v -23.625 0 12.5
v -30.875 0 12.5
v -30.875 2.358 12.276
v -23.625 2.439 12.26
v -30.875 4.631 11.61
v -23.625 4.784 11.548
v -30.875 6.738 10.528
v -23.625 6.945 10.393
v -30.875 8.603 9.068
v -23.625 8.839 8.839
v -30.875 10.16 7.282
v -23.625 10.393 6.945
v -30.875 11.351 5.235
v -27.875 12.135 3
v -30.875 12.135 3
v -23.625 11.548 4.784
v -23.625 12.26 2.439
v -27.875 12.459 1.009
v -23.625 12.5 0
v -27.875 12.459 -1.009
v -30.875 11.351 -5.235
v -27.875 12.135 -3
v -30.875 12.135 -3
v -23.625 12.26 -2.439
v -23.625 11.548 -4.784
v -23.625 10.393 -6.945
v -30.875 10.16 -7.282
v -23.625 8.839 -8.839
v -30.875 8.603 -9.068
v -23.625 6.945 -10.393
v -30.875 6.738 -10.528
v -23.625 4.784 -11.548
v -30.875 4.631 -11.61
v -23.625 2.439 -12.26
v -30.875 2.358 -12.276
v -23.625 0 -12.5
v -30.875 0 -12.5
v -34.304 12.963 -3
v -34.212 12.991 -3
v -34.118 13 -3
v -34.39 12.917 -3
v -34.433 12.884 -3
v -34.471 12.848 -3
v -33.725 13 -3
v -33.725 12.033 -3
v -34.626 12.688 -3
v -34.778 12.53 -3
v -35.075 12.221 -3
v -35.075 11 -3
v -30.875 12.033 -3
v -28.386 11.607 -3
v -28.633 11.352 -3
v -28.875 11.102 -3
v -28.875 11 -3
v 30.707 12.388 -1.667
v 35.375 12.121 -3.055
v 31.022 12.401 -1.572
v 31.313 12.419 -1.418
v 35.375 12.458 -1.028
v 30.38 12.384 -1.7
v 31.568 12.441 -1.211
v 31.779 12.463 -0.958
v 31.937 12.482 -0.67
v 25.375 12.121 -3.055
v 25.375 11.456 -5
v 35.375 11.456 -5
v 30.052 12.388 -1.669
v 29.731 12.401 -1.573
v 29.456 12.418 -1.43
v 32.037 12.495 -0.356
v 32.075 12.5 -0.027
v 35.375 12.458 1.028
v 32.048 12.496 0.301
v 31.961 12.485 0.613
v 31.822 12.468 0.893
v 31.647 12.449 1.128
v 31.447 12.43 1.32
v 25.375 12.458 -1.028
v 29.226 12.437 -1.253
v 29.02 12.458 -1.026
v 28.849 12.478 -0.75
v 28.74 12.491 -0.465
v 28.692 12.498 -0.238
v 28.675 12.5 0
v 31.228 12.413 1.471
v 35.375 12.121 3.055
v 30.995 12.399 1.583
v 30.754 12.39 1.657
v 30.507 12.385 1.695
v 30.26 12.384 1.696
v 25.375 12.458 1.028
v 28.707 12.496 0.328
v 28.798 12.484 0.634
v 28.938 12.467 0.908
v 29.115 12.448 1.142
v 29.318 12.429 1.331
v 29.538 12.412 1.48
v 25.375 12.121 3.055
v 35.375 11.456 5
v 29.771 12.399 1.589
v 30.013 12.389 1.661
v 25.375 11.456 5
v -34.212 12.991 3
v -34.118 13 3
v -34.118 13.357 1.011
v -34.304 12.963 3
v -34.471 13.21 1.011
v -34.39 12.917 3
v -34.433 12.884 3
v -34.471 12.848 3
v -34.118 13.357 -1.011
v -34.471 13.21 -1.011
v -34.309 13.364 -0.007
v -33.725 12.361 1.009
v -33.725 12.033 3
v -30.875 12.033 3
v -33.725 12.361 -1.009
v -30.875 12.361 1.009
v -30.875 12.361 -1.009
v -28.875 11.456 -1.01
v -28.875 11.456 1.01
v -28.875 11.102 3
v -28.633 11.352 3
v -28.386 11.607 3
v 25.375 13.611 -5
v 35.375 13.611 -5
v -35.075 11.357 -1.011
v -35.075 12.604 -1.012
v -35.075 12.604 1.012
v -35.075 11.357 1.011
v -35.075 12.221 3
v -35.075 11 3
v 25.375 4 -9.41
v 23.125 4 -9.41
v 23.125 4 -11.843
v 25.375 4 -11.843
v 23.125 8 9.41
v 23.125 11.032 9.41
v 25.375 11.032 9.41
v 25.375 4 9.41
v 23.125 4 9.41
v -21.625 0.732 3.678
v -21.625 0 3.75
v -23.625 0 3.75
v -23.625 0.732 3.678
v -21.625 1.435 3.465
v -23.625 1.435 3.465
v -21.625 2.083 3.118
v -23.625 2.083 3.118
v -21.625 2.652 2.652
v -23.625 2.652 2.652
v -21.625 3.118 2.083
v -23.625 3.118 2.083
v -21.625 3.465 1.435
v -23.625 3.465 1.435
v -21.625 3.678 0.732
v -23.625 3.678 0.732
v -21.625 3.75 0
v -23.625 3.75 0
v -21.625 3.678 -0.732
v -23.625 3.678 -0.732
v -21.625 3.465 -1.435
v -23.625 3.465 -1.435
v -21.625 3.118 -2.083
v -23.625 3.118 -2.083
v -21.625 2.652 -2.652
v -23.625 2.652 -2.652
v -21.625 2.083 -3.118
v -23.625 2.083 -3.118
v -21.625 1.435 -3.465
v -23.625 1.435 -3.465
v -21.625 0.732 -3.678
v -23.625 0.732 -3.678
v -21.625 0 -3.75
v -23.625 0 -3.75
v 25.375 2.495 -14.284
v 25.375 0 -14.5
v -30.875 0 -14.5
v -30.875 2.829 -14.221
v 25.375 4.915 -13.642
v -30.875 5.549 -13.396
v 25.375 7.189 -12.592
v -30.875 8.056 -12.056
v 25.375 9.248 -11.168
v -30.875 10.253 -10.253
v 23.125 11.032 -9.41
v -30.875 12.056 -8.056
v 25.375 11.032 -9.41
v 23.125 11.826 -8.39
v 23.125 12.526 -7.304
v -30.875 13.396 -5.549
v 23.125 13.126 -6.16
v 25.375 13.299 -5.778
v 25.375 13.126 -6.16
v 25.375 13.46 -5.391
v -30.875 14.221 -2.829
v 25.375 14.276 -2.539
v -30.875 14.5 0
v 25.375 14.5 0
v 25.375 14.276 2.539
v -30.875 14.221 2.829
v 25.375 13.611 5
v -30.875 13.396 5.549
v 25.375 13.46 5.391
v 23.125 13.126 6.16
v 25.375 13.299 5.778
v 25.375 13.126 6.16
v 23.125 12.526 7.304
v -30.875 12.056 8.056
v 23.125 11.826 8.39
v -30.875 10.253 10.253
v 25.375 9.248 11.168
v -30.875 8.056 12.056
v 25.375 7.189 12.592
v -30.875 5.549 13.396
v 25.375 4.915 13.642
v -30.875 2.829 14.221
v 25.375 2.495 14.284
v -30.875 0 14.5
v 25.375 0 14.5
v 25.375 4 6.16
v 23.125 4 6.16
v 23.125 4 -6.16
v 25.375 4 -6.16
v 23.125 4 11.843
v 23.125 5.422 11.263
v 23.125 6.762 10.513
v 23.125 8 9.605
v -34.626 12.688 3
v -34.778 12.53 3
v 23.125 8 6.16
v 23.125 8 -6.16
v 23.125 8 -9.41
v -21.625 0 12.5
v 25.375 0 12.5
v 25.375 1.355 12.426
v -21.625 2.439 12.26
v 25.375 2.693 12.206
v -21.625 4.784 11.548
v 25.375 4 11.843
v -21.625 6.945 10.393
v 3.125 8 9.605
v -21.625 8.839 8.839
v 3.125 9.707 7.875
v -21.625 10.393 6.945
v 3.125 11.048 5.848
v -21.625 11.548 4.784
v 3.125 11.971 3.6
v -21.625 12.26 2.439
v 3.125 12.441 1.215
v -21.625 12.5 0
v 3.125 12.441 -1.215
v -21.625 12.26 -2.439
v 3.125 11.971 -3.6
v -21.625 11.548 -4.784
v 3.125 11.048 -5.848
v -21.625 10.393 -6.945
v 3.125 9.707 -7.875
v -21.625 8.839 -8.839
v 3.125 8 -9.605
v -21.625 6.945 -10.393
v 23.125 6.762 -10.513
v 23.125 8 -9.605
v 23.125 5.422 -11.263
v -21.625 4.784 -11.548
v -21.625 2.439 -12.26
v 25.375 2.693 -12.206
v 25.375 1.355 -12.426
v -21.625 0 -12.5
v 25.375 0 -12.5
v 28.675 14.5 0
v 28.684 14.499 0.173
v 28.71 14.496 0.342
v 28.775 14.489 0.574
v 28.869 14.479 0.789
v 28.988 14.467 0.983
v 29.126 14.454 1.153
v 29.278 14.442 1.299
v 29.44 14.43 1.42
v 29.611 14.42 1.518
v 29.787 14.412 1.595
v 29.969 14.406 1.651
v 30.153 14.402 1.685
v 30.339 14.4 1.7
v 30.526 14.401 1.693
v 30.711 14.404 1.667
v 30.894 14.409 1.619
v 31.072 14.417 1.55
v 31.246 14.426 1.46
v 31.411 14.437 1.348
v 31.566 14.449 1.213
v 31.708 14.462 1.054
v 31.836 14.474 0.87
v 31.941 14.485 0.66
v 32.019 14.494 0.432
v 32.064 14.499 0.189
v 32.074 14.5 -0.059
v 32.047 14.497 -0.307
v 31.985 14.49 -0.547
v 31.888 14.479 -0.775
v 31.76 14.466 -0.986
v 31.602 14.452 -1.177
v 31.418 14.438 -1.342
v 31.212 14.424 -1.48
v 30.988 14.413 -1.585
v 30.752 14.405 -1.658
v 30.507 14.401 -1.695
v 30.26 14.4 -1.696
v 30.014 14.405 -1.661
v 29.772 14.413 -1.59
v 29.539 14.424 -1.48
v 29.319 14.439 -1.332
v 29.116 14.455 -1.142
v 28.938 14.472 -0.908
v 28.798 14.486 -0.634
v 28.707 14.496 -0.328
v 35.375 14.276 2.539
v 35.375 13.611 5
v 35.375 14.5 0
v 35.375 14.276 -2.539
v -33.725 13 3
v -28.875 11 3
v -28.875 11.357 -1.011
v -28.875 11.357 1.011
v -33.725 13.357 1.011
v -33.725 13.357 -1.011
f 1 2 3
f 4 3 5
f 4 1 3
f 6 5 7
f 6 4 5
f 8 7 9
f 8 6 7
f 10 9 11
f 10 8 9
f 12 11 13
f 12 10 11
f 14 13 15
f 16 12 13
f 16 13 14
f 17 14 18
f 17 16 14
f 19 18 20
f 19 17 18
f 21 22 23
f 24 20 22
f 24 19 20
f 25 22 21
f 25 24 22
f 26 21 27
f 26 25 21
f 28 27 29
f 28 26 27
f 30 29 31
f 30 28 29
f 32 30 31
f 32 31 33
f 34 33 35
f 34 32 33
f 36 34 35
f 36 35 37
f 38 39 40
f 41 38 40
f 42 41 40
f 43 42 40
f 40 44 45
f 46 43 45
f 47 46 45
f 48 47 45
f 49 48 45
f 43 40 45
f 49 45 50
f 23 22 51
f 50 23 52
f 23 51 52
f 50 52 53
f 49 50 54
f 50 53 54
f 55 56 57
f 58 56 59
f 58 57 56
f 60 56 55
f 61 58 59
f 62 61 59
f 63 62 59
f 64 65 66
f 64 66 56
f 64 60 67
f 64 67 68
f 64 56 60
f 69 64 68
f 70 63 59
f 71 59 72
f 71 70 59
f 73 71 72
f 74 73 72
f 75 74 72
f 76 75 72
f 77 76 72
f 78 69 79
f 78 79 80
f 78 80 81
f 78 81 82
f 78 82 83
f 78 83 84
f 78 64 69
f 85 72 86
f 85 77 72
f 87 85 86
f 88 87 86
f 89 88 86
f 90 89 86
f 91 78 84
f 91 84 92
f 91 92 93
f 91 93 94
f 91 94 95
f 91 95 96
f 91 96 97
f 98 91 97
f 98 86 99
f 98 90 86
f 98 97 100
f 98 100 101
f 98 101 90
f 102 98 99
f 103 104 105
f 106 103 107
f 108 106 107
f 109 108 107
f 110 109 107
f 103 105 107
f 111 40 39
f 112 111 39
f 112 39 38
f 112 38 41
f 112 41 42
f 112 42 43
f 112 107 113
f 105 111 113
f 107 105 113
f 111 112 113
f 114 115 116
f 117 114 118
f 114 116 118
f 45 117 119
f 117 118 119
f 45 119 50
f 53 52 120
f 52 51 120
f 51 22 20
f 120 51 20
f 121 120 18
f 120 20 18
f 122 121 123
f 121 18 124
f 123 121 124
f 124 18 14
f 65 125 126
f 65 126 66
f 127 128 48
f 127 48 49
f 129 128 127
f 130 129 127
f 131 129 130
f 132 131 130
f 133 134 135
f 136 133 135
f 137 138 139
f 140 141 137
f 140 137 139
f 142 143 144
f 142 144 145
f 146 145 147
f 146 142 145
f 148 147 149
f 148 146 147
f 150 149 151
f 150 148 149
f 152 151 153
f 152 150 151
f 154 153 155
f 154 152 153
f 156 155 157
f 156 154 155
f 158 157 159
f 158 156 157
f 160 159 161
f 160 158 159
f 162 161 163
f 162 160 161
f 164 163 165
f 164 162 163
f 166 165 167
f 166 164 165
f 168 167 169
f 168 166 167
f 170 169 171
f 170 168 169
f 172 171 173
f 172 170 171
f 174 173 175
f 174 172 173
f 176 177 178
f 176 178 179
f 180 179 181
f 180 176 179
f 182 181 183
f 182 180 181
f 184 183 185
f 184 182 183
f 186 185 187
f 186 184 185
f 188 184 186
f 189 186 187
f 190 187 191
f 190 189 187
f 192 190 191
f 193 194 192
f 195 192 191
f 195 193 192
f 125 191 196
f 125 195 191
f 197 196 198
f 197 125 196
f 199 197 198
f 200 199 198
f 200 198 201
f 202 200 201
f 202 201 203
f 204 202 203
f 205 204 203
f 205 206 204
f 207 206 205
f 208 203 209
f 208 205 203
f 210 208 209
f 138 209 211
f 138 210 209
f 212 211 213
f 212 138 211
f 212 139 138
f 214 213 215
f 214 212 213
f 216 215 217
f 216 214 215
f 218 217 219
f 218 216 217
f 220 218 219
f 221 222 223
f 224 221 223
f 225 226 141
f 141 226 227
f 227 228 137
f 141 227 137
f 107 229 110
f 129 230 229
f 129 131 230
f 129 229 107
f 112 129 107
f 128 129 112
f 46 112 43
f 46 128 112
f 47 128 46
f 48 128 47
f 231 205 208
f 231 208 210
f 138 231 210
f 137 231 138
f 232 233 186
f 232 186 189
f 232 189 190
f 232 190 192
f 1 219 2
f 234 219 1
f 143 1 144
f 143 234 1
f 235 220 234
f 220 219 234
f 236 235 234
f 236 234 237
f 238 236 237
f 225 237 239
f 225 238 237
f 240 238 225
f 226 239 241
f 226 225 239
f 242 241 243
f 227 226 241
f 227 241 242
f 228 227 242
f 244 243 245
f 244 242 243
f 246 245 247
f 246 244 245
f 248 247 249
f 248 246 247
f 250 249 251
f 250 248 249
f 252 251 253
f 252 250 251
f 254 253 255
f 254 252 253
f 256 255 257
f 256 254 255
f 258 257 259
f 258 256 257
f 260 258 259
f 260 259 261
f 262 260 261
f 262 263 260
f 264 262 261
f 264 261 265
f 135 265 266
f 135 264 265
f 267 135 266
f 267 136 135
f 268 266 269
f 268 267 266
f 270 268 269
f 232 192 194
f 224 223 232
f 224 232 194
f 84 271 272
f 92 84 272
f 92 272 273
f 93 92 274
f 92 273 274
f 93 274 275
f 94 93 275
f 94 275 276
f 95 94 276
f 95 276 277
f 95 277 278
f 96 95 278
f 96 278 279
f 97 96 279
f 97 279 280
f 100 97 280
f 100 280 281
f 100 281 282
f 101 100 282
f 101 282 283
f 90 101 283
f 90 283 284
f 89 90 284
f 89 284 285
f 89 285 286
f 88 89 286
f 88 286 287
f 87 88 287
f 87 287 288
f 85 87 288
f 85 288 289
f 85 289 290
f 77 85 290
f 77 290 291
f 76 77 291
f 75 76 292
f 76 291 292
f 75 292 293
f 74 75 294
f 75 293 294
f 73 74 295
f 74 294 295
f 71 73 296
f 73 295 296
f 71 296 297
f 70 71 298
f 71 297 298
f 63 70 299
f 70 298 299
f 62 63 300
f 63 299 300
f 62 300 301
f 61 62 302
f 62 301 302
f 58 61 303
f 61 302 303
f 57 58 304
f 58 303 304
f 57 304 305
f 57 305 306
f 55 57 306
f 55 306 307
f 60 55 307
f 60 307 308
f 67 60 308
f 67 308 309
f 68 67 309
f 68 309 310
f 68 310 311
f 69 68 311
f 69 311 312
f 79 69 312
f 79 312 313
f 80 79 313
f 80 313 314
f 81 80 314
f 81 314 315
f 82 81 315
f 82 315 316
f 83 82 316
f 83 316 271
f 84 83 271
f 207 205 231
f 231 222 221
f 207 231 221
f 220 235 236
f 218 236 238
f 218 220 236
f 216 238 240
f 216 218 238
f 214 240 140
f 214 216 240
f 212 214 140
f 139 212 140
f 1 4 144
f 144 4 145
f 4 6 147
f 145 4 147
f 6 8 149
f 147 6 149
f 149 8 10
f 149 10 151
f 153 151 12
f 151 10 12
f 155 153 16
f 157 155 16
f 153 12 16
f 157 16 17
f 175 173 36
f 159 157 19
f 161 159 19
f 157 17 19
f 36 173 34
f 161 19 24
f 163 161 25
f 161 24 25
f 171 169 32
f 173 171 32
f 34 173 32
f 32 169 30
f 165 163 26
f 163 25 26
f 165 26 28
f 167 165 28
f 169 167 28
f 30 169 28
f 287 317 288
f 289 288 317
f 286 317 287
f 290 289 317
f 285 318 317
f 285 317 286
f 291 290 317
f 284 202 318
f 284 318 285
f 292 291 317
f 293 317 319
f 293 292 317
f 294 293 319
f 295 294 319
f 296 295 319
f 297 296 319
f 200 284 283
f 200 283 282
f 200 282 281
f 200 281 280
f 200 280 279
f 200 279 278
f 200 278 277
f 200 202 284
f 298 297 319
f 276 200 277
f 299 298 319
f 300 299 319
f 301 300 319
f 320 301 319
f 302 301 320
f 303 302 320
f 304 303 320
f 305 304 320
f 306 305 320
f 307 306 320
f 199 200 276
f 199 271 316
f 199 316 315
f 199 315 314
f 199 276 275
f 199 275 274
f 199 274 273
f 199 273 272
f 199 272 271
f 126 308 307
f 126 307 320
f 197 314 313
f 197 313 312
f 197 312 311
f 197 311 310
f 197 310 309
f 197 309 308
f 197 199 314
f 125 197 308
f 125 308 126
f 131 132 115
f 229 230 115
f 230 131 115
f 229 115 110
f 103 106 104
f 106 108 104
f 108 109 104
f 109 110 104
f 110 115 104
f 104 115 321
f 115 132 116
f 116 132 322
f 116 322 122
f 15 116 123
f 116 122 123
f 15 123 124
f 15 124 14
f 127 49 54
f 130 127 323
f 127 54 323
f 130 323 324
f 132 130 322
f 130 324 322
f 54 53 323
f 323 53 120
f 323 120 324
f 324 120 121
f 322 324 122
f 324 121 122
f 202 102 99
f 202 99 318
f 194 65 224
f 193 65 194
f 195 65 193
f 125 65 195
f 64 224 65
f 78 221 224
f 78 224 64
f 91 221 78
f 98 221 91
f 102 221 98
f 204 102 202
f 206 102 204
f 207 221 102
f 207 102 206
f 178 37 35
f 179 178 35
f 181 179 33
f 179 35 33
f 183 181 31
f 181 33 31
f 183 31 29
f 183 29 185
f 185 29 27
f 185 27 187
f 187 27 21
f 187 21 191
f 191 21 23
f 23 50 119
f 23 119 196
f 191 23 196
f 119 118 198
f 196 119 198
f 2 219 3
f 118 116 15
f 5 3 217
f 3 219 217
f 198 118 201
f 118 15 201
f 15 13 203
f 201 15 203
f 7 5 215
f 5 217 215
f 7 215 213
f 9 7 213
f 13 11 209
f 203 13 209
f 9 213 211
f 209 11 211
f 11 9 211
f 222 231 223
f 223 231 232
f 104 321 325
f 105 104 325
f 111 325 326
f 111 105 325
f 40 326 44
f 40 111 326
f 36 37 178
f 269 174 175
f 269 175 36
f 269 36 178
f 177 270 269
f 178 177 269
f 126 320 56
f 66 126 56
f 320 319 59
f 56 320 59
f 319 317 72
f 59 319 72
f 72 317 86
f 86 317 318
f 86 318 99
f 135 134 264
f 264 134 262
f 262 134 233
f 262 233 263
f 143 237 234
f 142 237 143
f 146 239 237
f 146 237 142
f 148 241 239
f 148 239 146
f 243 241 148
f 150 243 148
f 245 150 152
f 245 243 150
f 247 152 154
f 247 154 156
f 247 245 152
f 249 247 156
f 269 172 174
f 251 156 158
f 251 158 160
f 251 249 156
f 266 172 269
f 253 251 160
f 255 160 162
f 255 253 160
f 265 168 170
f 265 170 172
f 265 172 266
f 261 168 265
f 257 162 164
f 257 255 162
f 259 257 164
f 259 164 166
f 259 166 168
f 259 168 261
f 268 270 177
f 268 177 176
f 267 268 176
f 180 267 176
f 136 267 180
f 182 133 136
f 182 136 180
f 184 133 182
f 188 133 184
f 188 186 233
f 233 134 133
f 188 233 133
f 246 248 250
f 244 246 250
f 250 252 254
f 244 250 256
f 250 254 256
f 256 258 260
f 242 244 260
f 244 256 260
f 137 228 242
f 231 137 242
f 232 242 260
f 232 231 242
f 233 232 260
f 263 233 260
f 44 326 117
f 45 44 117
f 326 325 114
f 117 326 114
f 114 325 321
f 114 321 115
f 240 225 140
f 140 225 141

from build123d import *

# Parameters (mm, degrees)
SALIENTE_EXTRUIR1_DEPTH  = 30.875
SALIENTE_EXTRUIR2_DEPTH  = 2
SALIENTE_EXTRUIR3_DEPTH  = 20
SALIENTE_EXTRUIR4_START  = 3
SALIENTE_EXTRUIR4_DEPTH  = 3
CROQUIS6_W               = 2
CROQUIS6_H               = 6
SALIENTE_EXTRUIR6_DEPTH  = 2.5
CORTAR_EXTRUIR1_REACH    = 67.066
SALIENTE_EXTRUIR7_START  = 4.2
SALIENTE_EXTRUIR7_DEPTH  = 4.2
SALIENTE_EXTRUIR9_DEPTH  = 1.35
CHAFL_N3_SIZE            = 0.75
REDONDEO1_R              = 0.5
CHAFL_N4_SIZE            = 1
CORTAR_EXTRUIR2_DEPTH    = 5.5
SALIENTE_EXTRUIR10_START = 10
SALIENTE_EXTRUIR10_DEPTH = 10
CORTAR_EXTRUIR3_REACH    = 42.889
CROQUIS11_R              = 1.7
CROQUIS14_W              = 2.25
CROQUIS14_H              = 3.25
CORTAR_EXTRUIR6_DEPTH    = 40.647076022


with BuildPart() as part:
    # Croquis2 → Saliente-Extruir1 (new, symmetric)
    with BuildSketch(Plane.YZ):
        with BuildLine():
            Line((0, -12.5), (0, -14.5))
            ThreePointArc((0, -14.5), (14.5, 0), (0, 14.5))
            Line((0, 14.5), (0, 12.5))
            ThreePointArc((0, 12.5), (12.5, 0), (0, -12.5))
        make_face()
    extrude(amount=SALIENTE_EXTRUIR1_DEPTH, both=True)

    # Croquis3 → Saliente-Extruir2 (add)
    with BuildSketch(Plane(origin=(-21.625, 0, 0), x_dir=(0, 0, -1), z_dir=(1, 0, 0))):
        with BuildLine():
            Line((-12.5, 0), (-3.75, 0))
            ThreePointArc((-3.75, 0), (0, 3.75), (3.75, 0))
            Line((3.75, 0), (12.5, 0))
            ThreePointArc((12.5, 0), (0, 12.5), (-12.5, 0))
        make_face()
    extrude(amount=-SALIENTE_EXTRUIR2_DEPTH)

    # Croquis4 → Saliente-Extruir3 (add)
    with BuildSketch(Plane(origin=(23.125, 0, 0), x_dir=(0, 0, -1), z_dir=(1, 0, 0))):
        with BuildLine():
            ThreePointArc((9.604686356, 8), (0, 12.5), (-9.604686356, 8))
            Line((-9.604686356, 8), (9.604686356, 8))
        make_face()
    extrude(amount=-SALIENTE_EXTRUIR3_DEPTH)

    # Croquis4<4> → Saliente-Extruir4 (add)
    with BuildSketch(Plane(origin=(23.125, 0, 0), x_dir=(0, 0, -1), z_dir=(1, 0, 0)).offset(SALIENTE_EXTRUIR4_START)):
        with BuildLine():
            Line((-11.842719282, 4), (11.842719282, 4))
            ThreePointArc((11.842719282, 4), (0, 12.5), (-11.842719282, 4))
        make_face()
    extrude(amount=-SALIENTE_EXTRUIR4_DEPTH)

    # Croquis6 → Saliente-Extruir6 (add)
    with BuildSketch(Plane(origin=(0, 13.5, 0), x_dir=(-1, 0, 0), z_dir=(0, 1, 0))):
        with Locations((29.875, 0)):
            Rectangle(CROQUIS6_W, CROQUIS6_H)
    extrude(amount=-SALIENTE_EXTRUIR6_DEPTH)

    # Croquis7 → Cortar-Extruir1 (cut, up to next)
    with BuildSketch(Plane(origin=(-30.875, 0, 0), x_dir=(0, -1, 0), z_dir=(-1, 0, 0)), mode=Mode.PRIVATE) as cortar_extruir1_sk1:
        with BuildLine():
            Line((-11, -3), (-11, 3))
            ThreePointArc((-11, 3), (-11.401754251, 0), (-11, -3))
        make_face()
    cortar_extruir1_tool1 = extrude(cortar_extruir1_sk1.sketch, amount=-CORTAR_EXTRUIR1_REACH, mode=Mode.PRIVATE) & part.part
    add(cortar_extruir1_tool1.solids().sort_by_distance((-30.875, 11.160947, 0))[0], mode=Mode.SUBTRACT)

    # Croquis7<4> → Saliente-Extruir7 (add)
    with BuildSketch(Plane(origin=(-30.875, 0, 0), x_dir=(0, -1, 0), z_dir=(-1, 0, 0)).offset(SALIENTE_EXTRUIR7_START)):
        with BuildLine():
            ThreePointArc((-11, -3), (-11.401754251, 0), (-11, 3))
            Line((-11, 3), (-12.033432948, 3))
            ThreePointArc((-12.033432948, 3), (-12.401754251, 0), (-12.033432948, -3))
            Line((-12.033432948, -3), (-11, -3))
        make_face()
    extrude(amount=-SALIENTE_EXTRUIR7_DEPTH)

    # Croquis8 → Saliente-Extruir9 (add)
    with BuildSketch(Plane(origin=(-35.075, 0, 0), x_dir=(0, -1, 0), z_dir=(-1, 0, 0))):
        with BuildLine():
            Line((-11, 3), (-13, 3))
            ThreePointArc((-13, 3), (-13.401754251, 0), (-13, -3))
            Line((-13, -3), (-11, -3))
            ThreePointArc((-11, -3), (-11.401754251, 0), (-11, 3))
        make_face()
    extrude(amount=-SALIENTE_EXTRUIR9_DEPTH)

    # Chaflán3
    chafl_n3_edges = [part.edges().sort_by_distance(p)[0] for p in [
        (-35.075, 13.401754251, 0),
    ]]
    chamfer(chafl_n3_edges, length=CHAFL_N3_SIZE)

    # Redondeo1
    redondeo1_edges = [part.edges().sort_by_distance(p)[0] for p in [
        (-34.325, 13.401754251, 0),
    ]]
    fillet(redondeo1_edges, radius=REDONDEO1_R)

    # Chaflán4
    chafl_n4_edges = [part.edges().sort_by_distance(p)[0] for p in [
        (-28.875, 12.5, 0),
    ]]
    chamfer(chafl_n4_edges, length=CHAFL_N4_SIZE)

    # Croquis9 → Cortar-Extruir2 (cut)
    with BuildSketch(Plane.YZ.offset(30.875)):
        with BuildLine():
            Line((4, 11.842719282), (4, -11.842719282))
            ThreePointArc((4, -11.842719282), (2.026821276, -12.33458534), (0, -12.5))
            Line((0, -12.5), (0, -14.5))
            ThreePointArc((0, -14.5), (14.5, 0), (0, 14.5))
            Line((0, 14.5), (0, 12.5))
            ThreePointArc((0, 12.5), (2.026821276, 12.33458534), (4, 11.842719282))
        make_face()
    extrude(amount=-CORTAR_EXTRUIR2_DEPTH, mode=Mode.SUBTRACT)

    # Croquis10 → Saliente-Extruir10 (add)
    with BuildSketch(Plane.YZ.offset(25.375).offset(SALIENTE_EXTRUIR10_START)):
        with BuildLine():
            Line((11.456439237, 5), (13.610657589, 5))
            ThreePointArc((13.610657589, 5), (14.5, 0), (13.610657589, -5))
            Line((13.610657589, -5), (11.456439237, -5))
            ThreePointArc((11.456439237, -5), (12.5, 0), (11.456439237, 5))
        make_face()
    extrude(amount=-SALIENTE_EXTRUIR10_DEPTH)

    # Croquis11 → Cortar-Extruir3 (cut, up to next)
    with BuildSketch(Plane(origin=(0, 14.5, 0), x_dir=(-1, 0, 0), z_dir=(0, 1, 0)), mode=Mode.PRIVATE) as cortar_extruir3_sk1:
        with Locations((-30.375, 0)):
            Circle(CROQUIS11_R)
    cortar_extruir3_tool1 = extrude(cortar_extruir3_sk1.sketch, amount=-CORTAR_EXTRUIR3_REACH, mode=Mode.PRIVATE) & part.part
    add(cortar_extruir3_tool1.solids().sort_by_distance((30.375, 14.5, 0))[0], mode=Mode.SUBTRACT)

    # Croquis14 → Cortar-Extruir6 (cut, through all)
    with BuildSketch(Plane.XZ.offset(-4)):
        with Locations((24.25, 7.785)):
            Rectangle(CROQUIS14_W, CROQUIS14_H)
        with Locations((24.25, -7.785)):
            Rectangle(CROQUIS14_W, CROQUIS14_H)
    extrude(amount=-CORTAR_EXTRUIR6_DEPTH, mode=Mode.SUBTRACT)


solid = part.part
